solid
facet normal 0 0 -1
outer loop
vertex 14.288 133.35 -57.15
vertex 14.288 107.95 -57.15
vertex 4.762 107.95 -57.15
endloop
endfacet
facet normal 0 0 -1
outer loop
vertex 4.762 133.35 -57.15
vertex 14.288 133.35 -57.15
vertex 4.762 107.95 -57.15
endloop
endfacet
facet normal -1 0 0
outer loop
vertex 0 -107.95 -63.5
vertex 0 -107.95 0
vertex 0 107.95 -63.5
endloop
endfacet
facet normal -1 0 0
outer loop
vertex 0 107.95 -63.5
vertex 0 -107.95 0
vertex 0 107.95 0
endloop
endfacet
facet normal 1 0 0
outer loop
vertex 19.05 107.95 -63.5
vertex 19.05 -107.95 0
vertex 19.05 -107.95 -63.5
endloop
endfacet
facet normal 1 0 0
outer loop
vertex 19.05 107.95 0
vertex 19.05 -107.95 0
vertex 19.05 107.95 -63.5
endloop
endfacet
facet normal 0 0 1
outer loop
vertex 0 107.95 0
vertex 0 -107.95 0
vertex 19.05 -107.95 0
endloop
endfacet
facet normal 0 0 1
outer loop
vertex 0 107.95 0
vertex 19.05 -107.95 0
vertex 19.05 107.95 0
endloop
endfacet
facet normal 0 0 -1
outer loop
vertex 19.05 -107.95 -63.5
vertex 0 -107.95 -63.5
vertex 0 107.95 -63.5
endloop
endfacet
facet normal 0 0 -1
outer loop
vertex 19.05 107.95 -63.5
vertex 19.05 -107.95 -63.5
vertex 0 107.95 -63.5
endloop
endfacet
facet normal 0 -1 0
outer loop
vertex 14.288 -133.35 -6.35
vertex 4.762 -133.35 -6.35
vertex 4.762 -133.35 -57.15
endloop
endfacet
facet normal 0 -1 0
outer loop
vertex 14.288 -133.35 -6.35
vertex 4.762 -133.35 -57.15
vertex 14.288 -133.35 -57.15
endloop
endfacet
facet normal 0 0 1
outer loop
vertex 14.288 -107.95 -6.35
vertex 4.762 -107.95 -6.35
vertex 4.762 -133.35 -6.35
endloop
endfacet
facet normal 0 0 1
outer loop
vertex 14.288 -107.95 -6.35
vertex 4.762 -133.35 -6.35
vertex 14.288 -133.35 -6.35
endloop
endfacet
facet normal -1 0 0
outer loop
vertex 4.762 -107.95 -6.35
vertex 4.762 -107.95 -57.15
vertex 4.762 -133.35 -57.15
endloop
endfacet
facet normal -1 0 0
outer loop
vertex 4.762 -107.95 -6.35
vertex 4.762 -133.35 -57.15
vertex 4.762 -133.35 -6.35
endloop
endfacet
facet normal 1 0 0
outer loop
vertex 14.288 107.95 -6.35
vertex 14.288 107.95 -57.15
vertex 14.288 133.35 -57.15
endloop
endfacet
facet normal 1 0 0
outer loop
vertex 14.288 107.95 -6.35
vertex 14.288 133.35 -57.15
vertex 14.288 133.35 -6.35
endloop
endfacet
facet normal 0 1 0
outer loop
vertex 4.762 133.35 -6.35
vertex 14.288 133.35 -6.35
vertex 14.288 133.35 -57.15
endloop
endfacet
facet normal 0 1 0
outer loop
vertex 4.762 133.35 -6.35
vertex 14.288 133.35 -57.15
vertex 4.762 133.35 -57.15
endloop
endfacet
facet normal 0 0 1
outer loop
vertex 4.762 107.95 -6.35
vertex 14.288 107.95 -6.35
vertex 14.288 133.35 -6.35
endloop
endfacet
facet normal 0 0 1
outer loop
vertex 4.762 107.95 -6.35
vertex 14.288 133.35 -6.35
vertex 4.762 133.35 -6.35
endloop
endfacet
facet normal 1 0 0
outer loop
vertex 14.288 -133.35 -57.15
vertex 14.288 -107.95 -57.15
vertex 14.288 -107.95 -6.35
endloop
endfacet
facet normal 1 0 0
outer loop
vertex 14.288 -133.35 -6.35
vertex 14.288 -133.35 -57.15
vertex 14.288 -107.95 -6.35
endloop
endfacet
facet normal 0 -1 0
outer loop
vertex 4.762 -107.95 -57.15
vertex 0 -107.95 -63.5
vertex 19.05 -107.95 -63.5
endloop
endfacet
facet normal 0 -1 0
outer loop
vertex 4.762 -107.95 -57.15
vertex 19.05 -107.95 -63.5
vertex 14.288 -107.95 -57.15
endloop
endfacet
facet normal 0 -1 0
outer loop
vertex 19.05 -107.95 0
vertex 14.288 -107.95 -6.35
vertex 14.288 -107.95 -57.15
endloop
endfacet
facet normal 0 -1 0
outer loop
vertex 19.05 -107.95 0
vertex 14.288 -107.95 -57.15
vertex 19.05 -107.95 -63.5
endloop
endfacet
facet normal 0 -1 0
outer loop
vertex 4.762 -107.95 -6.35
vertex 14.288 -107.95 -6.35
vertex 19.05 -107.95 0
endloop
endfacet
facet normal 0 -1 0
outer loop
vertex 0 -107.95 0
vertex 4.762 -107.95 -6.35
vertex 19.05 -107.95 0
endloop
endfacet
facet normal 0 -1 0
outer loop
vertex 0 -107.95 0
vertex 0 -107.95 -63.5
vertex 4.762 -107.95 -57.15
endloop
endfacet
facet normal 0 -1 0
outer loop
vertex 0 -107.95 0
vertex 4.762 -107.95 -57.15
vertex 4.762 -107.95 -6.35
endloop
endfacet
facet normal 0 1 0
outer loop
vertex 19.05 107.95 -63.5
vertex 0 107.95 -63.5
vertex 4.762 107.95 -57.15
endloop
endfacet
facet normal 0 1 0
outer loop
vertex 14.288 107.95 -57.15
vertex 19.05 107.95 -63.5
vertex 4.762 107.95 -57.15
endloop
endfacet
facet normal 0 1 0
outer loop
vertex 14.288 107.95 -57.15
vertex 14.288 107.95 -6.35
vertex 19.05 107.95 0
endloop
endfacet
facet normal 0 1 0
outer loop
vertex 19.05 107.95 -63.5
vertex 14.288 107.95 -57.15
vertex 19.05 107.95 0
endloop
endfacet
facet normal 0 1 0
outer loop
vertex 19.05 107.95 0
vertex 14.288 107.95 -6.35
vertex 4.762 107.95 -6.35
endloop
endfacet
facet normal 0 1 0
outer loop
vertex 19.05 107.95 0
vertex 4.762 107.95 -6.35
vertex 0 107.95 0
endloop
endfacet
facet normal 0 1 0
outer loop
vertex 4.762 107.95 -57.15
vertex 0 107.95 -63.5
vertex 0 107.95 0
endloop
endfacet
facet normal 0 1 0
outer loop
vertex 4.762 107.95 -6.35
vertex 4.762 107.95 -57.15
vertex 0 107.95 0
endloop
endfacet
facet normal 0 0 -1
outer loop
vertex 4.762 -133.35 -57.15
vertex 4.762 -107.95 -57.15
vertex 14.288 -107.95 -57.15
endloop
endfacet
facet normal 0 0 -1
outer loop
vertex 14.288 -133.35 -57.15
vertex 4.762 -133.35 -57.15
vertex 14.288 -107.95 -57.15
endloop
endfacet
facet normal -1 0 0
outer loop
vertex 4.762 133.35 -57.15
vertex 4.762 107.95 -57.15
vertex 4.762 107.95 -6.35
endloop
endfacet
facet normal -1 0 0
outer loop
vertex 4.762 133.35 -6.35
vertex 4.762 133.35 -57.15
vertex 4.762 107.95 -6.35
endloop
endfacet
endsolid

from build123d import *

# Parameters (mm, degrees)
F0_W     = 215.9
F0_H     = 63.5
F1_DEPTH = 19.05
F2_W     = 9.525
F2_H     = 50.8
F3_DEPTH = 25.4
F4_W     = 9.525
F4_H     = 50.8
F5_DEPTH = 25.4


with BuildPart() as f1:
    # F0 (on Right) → F1 (new body)
    with BuildSketch(Plane.YZ):
        with Locations((0, -31.75)):
            Rectangle(F0_W, F0_H)
    extrude(amount=F1_DEPTH)

    # F2 (on face) → F3 (join)
    with BuildSketch(Plane(origin=(0, 107.95, 0), x_dir=(-1, 0, 0), z_dir=(0, 1, 0))):
        with Locations((-9.525, -31.75)):
            Rectangle(F2_W, F2_H)
    extrude(amount=F3_DEPTH)

    # F4 (on face) → F5 (join)
    with BuildSketch(Plane.XZ.offset(107.95)):
        with Locations((9.525, -31.75)):
            Rectangle(F4_W, F4_H)
    extrude(amount=F5_DEPTH)


solid = f1.part
